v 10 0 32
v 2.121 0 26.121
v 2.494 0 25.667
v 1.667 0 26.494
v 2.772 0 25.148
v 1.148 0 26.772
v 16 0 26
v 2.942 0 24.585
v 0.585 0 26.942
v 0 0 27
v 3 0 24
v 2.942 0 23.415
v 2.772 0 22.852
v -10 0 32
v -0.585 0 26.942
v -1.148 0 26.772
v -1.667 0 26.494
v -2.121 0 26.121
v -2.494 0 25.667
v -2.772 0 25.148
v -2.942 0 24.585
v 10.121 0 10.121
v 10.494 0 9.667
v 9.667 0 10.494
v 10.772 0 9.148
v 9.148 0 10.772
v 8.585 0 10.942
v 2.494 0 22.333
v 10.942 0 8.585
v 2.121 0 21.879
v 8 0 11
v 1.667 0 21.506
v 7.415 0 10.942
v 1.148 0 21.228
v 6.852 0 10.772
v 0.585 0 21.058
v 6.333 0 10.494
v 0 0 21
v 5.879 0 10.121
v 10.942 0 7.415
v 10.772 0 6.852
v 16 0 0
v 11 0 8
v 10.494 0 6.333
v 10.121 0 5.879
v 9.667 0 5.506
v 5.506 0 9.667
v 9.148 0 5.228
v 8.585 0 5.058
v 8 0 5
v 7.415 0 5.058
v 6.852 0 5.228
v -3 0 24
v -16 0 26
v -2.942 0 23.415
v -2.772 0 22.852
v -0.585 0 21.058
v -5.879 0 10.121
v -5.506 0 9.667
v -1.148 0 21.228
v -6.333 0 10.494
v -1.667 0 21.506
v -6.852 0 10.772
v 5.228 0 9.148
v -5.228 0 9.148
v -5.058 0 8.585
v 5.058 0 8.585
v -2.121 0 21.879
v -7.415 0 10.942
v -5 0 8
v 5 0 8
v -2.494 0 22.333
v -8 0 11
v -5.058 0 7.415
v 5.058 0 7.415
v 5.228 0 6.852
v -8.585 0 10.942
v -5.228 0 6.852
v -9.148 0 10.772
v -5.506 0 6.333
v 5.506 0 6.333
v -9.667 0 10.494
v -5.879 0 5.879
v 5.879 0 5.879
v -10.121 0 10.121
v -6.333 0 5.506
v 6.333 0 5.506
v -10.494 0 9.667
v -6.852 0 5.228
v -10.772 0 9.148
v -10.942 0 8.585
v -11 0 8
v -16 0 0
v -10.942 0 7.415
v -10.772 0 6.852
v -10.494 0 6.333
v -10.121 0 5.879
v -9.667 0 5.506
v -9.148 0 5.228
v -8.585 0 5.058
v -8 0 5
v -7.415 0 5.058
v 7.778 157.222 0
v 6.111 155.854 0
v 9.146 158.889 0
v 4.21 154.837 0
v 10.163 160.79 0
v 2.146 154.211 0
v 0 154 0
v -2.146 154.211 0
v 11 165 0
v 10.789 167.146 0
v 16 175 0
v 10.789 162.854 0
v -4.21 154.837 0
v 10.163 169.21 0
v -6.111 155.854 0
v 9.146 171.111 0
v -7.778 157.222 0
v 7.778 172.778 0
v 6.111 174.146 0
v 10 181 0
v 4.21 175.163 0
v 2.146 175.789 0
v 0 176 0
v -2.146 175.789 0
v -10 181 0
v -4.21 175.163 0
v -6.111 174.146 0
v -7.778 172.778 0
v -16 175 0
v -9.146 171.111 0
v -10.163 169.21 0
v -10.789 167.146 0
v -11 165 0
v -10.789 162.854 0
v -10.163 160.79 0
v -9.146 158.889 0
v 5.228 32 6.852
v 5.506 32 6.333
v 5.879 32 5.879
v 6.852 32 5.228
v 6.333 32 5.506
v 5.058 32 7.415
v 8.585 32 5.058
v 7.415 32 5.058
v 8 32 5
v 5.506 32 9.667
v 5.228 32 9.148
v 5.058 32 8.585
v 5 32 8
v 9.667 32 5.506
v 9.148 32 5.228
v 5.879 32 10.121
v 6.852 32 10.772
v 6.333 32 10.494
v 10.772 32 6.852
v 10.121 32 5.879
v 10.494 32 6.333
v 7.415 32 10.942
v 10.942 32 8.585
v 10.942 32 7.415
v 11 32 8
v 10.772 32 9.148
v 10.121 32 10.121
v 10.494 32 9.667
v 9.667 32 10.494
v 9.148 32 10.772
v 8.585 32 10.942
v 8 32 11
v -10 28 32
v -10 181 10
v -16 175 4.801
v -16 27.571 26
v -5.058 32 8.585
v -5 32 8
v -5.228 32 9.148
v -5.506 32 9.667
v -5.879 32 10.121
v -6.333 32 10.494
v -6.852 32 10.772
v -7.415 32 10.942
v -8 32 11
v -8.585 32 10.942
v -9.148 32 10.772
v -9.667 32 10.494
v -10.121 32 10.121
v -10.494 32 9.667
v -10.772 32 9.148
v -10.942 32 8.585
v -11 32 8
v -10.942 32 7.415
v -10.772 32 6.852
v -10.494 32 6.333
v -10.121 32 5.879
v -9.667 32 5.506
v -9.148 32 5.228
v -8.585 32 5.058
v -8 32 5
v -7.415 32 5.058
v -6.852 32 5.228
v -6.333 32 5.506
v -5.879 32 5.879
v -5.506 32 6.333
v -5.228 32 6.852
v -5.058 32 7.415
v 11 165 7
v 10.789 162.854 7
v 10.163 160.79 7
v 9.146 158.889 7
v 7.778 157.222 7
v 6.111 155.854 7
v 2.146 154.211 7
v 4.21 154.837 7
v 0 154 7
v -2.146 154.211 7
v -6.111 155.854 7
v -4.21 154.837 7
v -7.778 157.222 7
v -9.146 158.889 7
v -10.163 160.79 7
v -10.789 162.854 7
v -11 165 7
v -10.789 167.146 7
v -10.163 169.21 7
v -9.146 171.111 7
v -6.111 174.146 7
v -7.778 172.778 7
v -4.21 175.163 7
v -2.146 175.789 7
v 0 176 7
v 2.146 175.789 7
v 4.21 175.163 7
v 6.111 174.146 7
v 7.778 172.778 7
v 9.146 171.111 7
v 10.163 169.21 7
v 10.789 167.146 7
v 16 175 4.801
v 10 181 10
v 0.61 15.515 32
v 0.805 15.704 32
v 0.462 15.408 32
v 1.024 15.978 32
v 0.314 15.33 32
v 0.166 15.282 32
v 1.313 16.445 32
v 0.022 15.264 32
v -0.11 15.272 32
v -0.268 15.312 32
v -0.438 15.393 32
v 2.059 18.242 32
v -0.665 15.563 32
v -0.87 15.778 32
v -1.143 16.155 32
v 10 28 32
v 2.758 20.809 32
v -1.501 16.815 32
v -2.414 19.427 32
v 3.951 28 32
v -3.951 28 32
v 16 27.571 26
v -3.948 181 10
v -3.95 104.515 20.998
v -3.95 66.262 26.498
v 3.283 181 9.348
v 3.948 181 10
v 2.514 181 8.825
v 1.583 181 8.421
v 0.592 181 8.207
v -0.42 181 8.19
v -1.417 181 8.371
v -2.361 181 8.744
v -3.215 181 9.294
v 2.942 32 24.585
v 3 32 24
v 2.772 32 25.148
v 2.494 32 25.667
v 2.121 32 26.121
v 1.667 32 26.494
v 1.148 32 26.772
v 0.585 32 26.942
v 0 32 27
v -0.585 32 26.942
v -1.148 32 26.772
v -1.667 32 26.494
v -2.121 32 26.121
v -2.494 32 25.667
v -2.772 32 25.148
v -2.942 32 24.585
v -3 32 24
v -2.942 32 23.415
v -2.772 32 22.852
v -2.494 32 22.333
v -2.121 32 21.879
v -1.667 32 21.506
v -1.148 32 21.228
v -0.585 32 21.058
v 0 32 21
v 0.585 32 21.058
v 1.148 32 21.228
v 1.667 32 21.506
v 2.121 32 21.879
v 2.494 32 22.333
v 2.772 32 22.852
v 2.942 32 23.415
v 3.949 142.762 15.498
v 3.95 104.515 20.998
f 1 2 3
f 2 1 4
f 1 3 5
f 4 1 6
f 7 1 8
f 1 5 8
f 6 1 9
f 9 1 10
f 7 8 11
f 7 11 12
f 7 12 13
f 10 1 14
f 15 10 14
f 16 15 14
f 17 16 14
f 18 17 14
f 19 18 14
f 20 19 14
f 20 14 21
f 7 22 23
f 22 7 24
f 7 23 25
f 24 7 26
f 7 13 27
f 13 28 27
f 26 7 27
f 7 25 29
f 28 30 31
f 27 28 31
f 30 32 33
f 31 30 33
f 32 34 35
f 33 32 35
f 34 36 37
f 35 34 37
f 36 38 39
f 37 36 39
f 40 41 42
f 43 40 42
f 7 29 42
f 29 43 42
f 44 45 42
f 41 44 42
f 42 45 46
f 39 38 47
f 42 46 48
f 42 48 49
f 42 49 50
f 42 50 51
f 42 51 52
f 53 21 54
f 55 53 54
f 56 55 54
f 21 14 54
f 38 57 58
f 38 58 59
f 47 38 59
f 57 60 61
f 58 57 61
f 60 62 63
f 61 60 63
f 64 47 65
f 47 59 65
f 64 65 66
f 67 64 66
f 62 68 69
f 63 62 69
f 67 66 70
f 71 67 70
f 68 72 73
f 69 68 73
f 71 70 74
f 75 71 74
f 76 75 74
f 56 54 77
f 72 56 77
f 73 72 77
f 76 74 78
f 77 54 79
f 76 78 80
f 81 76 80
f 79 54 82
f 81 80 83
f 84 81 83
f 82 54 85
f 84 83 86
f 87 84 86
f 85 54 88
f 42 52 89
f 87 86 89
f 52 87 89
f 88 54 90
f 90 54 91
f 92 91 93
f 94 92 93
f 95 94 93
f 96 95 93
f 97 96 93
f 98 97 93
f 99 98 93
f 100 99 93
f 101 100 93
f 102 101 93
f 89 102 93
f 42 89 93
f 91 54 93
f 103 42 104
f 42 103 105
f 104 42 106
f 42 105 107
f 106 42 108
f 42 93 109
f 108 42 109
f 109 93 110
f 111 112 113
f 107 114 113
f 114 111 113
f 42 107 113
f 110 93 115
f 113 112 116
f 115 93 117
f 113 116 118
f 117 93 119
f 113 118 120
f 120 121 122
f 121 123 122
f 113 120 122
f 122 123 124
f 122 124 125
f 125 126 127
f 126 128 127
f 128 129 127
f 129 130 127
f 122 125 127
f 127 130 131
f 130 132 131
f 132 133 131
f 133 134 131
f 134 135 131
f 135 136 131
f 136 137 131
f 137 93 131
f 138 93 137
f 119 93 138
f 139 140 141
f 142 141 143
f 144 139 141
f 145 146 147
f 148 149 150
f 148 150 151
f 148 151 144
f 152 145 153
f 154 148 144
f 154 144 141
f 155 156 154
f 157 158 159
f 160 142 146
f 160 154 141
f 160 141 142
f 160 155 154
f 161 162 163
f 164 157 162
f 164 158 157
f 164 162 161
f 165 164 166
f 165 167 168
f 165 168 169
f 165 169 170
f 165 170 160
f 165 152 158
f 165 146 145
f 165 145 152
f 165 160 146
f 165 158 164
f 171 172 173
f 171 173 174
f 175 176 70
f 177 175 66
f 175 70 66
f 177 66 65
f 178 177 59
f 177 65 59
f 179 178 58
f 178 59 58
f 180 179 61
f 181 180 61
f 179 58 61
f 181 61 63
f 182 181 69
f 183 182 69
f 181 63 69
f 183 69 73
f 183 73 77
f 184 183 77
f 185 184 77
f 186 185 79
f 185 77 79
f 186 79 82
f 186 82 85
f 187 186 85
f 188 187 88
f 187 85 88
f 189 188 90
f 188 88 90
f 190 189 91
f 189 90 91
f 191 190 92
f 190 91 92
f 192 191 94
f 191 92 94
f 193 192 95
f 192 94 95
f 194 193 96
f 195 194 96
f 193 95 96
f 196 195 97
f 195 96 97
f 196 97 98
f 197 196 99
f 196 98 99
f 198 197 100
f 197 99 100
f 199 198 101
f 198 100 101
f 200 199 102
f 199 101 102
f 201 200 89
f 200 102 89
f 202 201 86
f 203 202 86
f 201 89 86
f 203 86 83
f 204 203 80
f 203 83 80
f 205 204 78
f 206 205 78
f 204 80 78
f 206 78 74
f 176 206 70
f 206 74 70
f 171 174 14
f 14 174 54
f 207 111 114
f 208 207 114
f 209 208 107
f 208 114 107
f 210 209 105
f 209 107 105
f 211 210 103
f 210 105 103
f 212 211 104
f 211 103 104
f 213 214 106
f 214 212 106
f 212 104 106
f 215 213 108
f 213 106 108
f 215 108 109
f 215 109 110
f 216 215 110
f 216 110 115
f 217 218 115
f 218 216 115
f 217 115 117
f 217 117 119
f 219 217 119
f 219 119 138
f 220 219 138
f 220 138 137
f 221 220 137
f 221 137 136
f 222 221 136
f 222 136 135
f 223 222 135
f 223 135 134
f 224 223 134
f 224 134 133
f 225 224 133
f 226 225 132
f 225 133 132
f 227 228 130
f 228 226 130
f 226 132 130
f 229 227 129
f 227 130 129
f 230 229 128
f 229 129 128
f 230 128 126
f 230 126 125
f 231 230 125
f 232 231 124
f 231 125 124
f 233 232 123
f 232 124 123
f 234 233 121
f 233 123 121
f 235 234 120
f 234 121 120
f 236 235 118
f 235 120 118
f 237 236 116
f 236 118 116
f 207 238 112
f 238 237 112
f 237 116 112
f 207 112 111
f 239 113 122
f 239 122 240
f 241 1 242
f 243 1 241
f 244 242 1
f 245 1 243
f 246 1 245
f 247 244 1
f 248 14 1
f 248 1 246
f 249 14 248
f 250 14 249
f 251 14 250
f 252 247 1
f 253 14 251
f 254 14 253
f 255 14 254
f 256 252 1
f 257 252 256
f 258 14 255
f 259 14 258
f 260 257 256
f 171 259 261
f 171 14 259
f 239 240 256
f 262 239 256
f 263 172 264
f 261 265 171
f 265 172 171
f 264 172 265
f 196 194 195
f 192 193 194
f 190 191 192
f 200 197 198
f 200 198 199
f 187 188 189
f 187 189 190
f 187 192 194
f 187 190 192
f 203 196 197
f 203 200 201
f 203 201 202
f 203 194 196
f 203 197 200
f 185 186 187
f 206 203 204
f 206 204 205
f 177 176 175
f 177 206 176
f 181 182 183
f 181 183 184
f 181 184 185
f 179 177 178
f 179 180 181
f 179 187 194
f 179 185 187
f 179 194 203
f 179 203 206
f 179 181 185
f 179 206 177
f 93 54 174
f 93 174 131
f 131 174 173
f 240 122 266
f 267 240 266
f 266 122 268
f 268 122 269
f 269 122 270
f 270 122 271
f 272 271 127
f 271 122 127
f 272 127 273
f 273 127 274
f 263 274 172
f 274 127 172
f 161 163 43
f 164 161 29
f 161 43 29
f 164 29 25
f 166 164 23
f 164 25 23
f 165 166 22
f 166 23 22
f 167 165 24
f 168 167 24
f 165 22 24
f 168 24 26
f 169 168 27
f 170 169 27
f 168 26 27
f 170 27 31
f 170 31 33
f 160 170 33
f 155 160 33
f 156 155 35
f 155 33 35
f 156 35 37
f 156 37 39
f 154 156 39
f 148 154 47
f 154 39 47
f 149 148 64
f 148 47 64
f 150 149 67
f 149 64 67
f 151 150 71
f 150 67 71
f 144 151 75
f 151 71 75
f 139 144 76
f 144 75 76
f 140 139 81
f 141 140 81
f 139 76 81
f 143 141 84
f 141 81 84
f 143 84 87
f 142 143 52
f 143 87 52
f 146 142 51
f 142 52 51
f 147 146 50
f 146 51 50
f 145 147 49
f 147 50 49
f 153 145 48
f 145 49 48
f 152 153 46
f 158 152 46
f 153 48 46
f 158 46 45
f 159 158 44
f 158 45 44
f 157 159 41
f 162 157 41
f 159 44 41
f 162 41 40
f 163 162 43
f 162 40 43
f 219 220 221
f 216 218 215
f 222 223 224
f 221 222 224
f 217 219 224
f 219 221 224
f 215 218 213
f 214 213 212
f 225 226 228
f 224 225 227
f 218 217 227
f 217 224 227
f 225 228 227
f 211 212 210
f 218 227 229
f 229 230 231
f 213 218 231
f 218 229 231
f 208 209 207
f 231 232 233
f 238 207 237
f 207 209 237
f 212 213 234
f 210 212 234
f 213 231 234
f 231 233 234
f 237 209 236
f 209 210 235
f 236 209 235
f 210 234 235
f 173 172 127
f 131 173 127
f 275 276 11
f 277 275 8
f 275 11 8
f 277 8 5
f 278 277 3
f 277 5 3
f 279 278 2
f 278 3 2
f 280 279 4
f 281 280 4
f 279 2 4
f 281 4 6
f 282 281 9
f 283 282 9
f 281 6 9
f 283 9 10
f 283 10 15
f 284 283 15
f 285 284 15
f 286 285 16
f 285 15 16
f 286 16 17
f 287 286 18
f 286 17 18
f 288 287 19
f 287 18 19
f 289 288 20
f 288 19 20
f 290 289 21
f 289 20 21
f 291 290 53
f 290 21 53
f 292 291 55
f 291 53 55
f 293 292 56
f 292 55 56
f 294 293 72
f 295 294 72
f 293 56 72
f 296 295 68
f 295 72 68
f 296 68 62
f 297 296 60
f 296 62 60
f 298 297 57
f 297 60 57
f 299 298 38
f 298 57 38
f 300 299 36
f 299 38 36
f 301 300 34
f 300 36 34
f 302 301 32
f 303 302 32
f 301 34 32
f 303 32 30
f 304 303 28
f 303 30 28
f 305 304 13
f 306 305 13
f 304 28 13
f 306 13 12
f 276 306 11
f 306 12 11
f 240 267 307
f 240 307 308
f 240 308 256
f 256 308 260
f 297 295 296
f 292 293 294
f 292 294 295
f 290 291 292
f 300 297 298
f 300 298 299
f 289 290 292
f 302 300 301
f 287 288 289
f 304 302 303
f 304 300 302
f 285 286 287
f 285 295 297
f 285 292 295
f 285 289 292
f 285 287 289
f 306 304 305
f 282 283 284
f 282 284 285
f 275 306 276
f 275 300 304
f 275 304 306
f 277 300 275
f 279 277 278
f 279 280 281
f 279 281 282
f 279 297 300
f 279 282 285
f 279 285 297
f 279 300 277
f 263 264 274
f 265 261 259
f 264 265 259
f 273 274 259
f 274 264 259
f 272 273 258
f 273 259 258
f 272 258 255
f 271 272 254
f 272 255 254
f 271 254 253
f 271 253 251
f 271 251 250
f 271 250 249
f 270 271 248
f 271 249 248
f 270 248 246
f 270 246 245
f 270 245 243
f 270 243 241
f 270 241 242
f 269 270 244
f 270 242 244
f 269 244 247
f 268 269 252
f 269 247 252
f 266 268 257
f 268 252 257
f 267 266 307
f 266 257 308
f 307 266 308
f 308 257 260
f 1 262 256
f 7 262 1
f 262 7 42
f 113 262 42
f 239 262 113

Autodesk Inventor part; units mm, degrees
ref_plane "YZ Plane" through (0, 0, 0) normal (1, 0, 0) x (0, 1, 0)
ref_plane "XZ Plane" through (0, 0, 0) normal (0, 1, 0) x (-1, 0, 0)
sketch "Sketch1" plane through (0, 0, 0) normal (0, 0, 1) x (1, 0, 0)
  circle A0 centre (0, 165) radius 11
  line L0 (-11, 0) -> (-5, 0) construction
  line L1 (-5, 0) -> (-5, 24.6936) construction
  line L2 (-5, 24.6936) -> (-11, 24.6936) construction
  line L3 (-11, 24.6936) -> (-11, 0) construction
  line L4 (0, 0) -> (0, -33.6453) construction
  line L5 (11, 0) -> (5, 0) construction
  line L6 (5, 0) -> (5, 24.6936) construction
  line L7 (5, 24.6936) -> (11, 24.6936) construction
  line L8 (11, 24.6936) -> (11, 0) construction
  line L9 (16, 0) -> (-16, 0) construction
  line L10 (-16, 0) -> (-16, 181) construction
  line L11 (-16, 181) -> (16, 181) construction
  line L12 (16, 181) -> (16, 0) construction
  line L13 (-11, 168.4627) -> (-11, 161.5373) construction
  line L14 (-3.4627, 176) -> (3.4627, 176) construction
  point P0 (0, 0)
  point P1 (-11, 165)
  point P2 (0, 176)
  dimension "d0" = 22
  dimension "d1" = 165
  dimension "d2" = 6
  dimension "d3" = 10
  dimension "d4" = 5
  dimension "d8" = 5
  dimension "d9" = 5
  dimension "d10" = 32
sketch "Sketch2" plane through (0, 0, 0) normal (1, 0, 0) x (0, 1, 0)
  line L0 (0, 0) -> (181, 0)
  line L1 (181, 0) -> (181, 32) construction
  line L2 (181, 32) -> (0, 32) construction
  line L3 (0, 32) -> (0, 0)
  line L4 (0, 27) -> (25, 27)
  line L5 (25, 27) -> (25, 21)
  line L6 (25, 21) -> (0, 21)
  line L7 (0, 21) -> (0, 27)
  line L8 (25, 11) -> (0, 11)
  line L9 (0, 11) -> (0, 5)
  line L10 (0, 5) -> (25, 5)
  line L11 (25, 5) -> (25, 11)
  line L12 (0, 32) -> (28, 32)
  line L13 (176, 0) -> (154, 0) projected
  line L14 (176, 0) -> (154, 0) construction
  line L15 (154, 0) -> (154, 7) construction
  line L16 (154, 7) -> (176, 7) construction
  line L17 (176, 7) -> (176, 0) construction
  line L18 (181, 0) -> (181, 10)
  line L19 (181, 10) -> (28, 32)
  dimension "d7" = 32
  dimension "d11" = 6
  dimension "d12" = 10
  dimension "d13" = 5
  dimension "d14" = 25
  dimension "d15" = 7
  dimension "d16" = 3
  dimension "d17" = 3
extrude "Extrusion1" add sketch "Sketch2" along normal mid plane 32
chamfer "Chamfer1" distance 6 angle 45 6 edges at (-16, 104.5, 21) (-16, 14, 32) (16, 14, 32) (16, 104.5, 21) (-16, 181, 5) (16, 181, 5)
extrude "Extrusion2" cut sketch "Sketch1" along normal blind 7
sketch "Sketch3" plane through (-10, 181, 10) normal (0, 0.1423, 0.9898) x (1, 0, 0)
  line L0 (0, 0) -> (20, 0) projected
  line L1 (10, 0) -> (10, -154.5736)
  line L2 (0, -154.5736) -> (20, -154.5736) projected
  point P0 (10, -177.7341)
ref_plane "Work Plane1" through (0, 28, 32) normal (0, -0.9898, 0.1423) x (1, 0, 0)
sketch "Sketch4" plane through (0, 28, 32) normal (0, -0.9898, 0.1423) x (1, 0, 0)
  circle A0 centre (0, 3.4008) radius 5.2132
  point P0 (0, -35.6594)
extrude "Extrusion3" cut sketch "Sketch4" against normal through all both and the other way through all
sketch "Sketch5" plane through (-16, 0, 0) normal (0, -1, 0) x (1, 0, 0)
  circle A0 centre (8, 8) radius 3
  circle A1 centre (24, 8) radius 3
  circle A2 centre (16, 24) radius 3
  line L0 (32, 0) -> (0, 0) projected
  line L1 (24, 8) -> (8, 8) construction
  point P0 (16, 0)
  point P1 (16, 0)
  point P2 (16, 8)
  point P3 (16, 0)
  dimension "d27" = 6
  dimension "d28" = 16
  dimension "d29" = 8
  dimension "d30" = 16
extrude "Extrusion4" cut sketch "Sketch5" against normal blind 32
thread "Thread1" size "M6x1" class "6H" standard "ANSI Metric M Profile" full length
thread "Thread2" size "M6x1" class "6H" standard "ANSI Metric M Profile" full length
thread "Thread3" size "M6x1" class "6H" standard "ANSI Metric M Profile" full length
equation "\"d4\" = 0.5 * d3"
equation "\"d18\" = d10"
equation "\"d30\" = d28"
equation "\"d31\" = d10"
properties part number "GB-stand"
